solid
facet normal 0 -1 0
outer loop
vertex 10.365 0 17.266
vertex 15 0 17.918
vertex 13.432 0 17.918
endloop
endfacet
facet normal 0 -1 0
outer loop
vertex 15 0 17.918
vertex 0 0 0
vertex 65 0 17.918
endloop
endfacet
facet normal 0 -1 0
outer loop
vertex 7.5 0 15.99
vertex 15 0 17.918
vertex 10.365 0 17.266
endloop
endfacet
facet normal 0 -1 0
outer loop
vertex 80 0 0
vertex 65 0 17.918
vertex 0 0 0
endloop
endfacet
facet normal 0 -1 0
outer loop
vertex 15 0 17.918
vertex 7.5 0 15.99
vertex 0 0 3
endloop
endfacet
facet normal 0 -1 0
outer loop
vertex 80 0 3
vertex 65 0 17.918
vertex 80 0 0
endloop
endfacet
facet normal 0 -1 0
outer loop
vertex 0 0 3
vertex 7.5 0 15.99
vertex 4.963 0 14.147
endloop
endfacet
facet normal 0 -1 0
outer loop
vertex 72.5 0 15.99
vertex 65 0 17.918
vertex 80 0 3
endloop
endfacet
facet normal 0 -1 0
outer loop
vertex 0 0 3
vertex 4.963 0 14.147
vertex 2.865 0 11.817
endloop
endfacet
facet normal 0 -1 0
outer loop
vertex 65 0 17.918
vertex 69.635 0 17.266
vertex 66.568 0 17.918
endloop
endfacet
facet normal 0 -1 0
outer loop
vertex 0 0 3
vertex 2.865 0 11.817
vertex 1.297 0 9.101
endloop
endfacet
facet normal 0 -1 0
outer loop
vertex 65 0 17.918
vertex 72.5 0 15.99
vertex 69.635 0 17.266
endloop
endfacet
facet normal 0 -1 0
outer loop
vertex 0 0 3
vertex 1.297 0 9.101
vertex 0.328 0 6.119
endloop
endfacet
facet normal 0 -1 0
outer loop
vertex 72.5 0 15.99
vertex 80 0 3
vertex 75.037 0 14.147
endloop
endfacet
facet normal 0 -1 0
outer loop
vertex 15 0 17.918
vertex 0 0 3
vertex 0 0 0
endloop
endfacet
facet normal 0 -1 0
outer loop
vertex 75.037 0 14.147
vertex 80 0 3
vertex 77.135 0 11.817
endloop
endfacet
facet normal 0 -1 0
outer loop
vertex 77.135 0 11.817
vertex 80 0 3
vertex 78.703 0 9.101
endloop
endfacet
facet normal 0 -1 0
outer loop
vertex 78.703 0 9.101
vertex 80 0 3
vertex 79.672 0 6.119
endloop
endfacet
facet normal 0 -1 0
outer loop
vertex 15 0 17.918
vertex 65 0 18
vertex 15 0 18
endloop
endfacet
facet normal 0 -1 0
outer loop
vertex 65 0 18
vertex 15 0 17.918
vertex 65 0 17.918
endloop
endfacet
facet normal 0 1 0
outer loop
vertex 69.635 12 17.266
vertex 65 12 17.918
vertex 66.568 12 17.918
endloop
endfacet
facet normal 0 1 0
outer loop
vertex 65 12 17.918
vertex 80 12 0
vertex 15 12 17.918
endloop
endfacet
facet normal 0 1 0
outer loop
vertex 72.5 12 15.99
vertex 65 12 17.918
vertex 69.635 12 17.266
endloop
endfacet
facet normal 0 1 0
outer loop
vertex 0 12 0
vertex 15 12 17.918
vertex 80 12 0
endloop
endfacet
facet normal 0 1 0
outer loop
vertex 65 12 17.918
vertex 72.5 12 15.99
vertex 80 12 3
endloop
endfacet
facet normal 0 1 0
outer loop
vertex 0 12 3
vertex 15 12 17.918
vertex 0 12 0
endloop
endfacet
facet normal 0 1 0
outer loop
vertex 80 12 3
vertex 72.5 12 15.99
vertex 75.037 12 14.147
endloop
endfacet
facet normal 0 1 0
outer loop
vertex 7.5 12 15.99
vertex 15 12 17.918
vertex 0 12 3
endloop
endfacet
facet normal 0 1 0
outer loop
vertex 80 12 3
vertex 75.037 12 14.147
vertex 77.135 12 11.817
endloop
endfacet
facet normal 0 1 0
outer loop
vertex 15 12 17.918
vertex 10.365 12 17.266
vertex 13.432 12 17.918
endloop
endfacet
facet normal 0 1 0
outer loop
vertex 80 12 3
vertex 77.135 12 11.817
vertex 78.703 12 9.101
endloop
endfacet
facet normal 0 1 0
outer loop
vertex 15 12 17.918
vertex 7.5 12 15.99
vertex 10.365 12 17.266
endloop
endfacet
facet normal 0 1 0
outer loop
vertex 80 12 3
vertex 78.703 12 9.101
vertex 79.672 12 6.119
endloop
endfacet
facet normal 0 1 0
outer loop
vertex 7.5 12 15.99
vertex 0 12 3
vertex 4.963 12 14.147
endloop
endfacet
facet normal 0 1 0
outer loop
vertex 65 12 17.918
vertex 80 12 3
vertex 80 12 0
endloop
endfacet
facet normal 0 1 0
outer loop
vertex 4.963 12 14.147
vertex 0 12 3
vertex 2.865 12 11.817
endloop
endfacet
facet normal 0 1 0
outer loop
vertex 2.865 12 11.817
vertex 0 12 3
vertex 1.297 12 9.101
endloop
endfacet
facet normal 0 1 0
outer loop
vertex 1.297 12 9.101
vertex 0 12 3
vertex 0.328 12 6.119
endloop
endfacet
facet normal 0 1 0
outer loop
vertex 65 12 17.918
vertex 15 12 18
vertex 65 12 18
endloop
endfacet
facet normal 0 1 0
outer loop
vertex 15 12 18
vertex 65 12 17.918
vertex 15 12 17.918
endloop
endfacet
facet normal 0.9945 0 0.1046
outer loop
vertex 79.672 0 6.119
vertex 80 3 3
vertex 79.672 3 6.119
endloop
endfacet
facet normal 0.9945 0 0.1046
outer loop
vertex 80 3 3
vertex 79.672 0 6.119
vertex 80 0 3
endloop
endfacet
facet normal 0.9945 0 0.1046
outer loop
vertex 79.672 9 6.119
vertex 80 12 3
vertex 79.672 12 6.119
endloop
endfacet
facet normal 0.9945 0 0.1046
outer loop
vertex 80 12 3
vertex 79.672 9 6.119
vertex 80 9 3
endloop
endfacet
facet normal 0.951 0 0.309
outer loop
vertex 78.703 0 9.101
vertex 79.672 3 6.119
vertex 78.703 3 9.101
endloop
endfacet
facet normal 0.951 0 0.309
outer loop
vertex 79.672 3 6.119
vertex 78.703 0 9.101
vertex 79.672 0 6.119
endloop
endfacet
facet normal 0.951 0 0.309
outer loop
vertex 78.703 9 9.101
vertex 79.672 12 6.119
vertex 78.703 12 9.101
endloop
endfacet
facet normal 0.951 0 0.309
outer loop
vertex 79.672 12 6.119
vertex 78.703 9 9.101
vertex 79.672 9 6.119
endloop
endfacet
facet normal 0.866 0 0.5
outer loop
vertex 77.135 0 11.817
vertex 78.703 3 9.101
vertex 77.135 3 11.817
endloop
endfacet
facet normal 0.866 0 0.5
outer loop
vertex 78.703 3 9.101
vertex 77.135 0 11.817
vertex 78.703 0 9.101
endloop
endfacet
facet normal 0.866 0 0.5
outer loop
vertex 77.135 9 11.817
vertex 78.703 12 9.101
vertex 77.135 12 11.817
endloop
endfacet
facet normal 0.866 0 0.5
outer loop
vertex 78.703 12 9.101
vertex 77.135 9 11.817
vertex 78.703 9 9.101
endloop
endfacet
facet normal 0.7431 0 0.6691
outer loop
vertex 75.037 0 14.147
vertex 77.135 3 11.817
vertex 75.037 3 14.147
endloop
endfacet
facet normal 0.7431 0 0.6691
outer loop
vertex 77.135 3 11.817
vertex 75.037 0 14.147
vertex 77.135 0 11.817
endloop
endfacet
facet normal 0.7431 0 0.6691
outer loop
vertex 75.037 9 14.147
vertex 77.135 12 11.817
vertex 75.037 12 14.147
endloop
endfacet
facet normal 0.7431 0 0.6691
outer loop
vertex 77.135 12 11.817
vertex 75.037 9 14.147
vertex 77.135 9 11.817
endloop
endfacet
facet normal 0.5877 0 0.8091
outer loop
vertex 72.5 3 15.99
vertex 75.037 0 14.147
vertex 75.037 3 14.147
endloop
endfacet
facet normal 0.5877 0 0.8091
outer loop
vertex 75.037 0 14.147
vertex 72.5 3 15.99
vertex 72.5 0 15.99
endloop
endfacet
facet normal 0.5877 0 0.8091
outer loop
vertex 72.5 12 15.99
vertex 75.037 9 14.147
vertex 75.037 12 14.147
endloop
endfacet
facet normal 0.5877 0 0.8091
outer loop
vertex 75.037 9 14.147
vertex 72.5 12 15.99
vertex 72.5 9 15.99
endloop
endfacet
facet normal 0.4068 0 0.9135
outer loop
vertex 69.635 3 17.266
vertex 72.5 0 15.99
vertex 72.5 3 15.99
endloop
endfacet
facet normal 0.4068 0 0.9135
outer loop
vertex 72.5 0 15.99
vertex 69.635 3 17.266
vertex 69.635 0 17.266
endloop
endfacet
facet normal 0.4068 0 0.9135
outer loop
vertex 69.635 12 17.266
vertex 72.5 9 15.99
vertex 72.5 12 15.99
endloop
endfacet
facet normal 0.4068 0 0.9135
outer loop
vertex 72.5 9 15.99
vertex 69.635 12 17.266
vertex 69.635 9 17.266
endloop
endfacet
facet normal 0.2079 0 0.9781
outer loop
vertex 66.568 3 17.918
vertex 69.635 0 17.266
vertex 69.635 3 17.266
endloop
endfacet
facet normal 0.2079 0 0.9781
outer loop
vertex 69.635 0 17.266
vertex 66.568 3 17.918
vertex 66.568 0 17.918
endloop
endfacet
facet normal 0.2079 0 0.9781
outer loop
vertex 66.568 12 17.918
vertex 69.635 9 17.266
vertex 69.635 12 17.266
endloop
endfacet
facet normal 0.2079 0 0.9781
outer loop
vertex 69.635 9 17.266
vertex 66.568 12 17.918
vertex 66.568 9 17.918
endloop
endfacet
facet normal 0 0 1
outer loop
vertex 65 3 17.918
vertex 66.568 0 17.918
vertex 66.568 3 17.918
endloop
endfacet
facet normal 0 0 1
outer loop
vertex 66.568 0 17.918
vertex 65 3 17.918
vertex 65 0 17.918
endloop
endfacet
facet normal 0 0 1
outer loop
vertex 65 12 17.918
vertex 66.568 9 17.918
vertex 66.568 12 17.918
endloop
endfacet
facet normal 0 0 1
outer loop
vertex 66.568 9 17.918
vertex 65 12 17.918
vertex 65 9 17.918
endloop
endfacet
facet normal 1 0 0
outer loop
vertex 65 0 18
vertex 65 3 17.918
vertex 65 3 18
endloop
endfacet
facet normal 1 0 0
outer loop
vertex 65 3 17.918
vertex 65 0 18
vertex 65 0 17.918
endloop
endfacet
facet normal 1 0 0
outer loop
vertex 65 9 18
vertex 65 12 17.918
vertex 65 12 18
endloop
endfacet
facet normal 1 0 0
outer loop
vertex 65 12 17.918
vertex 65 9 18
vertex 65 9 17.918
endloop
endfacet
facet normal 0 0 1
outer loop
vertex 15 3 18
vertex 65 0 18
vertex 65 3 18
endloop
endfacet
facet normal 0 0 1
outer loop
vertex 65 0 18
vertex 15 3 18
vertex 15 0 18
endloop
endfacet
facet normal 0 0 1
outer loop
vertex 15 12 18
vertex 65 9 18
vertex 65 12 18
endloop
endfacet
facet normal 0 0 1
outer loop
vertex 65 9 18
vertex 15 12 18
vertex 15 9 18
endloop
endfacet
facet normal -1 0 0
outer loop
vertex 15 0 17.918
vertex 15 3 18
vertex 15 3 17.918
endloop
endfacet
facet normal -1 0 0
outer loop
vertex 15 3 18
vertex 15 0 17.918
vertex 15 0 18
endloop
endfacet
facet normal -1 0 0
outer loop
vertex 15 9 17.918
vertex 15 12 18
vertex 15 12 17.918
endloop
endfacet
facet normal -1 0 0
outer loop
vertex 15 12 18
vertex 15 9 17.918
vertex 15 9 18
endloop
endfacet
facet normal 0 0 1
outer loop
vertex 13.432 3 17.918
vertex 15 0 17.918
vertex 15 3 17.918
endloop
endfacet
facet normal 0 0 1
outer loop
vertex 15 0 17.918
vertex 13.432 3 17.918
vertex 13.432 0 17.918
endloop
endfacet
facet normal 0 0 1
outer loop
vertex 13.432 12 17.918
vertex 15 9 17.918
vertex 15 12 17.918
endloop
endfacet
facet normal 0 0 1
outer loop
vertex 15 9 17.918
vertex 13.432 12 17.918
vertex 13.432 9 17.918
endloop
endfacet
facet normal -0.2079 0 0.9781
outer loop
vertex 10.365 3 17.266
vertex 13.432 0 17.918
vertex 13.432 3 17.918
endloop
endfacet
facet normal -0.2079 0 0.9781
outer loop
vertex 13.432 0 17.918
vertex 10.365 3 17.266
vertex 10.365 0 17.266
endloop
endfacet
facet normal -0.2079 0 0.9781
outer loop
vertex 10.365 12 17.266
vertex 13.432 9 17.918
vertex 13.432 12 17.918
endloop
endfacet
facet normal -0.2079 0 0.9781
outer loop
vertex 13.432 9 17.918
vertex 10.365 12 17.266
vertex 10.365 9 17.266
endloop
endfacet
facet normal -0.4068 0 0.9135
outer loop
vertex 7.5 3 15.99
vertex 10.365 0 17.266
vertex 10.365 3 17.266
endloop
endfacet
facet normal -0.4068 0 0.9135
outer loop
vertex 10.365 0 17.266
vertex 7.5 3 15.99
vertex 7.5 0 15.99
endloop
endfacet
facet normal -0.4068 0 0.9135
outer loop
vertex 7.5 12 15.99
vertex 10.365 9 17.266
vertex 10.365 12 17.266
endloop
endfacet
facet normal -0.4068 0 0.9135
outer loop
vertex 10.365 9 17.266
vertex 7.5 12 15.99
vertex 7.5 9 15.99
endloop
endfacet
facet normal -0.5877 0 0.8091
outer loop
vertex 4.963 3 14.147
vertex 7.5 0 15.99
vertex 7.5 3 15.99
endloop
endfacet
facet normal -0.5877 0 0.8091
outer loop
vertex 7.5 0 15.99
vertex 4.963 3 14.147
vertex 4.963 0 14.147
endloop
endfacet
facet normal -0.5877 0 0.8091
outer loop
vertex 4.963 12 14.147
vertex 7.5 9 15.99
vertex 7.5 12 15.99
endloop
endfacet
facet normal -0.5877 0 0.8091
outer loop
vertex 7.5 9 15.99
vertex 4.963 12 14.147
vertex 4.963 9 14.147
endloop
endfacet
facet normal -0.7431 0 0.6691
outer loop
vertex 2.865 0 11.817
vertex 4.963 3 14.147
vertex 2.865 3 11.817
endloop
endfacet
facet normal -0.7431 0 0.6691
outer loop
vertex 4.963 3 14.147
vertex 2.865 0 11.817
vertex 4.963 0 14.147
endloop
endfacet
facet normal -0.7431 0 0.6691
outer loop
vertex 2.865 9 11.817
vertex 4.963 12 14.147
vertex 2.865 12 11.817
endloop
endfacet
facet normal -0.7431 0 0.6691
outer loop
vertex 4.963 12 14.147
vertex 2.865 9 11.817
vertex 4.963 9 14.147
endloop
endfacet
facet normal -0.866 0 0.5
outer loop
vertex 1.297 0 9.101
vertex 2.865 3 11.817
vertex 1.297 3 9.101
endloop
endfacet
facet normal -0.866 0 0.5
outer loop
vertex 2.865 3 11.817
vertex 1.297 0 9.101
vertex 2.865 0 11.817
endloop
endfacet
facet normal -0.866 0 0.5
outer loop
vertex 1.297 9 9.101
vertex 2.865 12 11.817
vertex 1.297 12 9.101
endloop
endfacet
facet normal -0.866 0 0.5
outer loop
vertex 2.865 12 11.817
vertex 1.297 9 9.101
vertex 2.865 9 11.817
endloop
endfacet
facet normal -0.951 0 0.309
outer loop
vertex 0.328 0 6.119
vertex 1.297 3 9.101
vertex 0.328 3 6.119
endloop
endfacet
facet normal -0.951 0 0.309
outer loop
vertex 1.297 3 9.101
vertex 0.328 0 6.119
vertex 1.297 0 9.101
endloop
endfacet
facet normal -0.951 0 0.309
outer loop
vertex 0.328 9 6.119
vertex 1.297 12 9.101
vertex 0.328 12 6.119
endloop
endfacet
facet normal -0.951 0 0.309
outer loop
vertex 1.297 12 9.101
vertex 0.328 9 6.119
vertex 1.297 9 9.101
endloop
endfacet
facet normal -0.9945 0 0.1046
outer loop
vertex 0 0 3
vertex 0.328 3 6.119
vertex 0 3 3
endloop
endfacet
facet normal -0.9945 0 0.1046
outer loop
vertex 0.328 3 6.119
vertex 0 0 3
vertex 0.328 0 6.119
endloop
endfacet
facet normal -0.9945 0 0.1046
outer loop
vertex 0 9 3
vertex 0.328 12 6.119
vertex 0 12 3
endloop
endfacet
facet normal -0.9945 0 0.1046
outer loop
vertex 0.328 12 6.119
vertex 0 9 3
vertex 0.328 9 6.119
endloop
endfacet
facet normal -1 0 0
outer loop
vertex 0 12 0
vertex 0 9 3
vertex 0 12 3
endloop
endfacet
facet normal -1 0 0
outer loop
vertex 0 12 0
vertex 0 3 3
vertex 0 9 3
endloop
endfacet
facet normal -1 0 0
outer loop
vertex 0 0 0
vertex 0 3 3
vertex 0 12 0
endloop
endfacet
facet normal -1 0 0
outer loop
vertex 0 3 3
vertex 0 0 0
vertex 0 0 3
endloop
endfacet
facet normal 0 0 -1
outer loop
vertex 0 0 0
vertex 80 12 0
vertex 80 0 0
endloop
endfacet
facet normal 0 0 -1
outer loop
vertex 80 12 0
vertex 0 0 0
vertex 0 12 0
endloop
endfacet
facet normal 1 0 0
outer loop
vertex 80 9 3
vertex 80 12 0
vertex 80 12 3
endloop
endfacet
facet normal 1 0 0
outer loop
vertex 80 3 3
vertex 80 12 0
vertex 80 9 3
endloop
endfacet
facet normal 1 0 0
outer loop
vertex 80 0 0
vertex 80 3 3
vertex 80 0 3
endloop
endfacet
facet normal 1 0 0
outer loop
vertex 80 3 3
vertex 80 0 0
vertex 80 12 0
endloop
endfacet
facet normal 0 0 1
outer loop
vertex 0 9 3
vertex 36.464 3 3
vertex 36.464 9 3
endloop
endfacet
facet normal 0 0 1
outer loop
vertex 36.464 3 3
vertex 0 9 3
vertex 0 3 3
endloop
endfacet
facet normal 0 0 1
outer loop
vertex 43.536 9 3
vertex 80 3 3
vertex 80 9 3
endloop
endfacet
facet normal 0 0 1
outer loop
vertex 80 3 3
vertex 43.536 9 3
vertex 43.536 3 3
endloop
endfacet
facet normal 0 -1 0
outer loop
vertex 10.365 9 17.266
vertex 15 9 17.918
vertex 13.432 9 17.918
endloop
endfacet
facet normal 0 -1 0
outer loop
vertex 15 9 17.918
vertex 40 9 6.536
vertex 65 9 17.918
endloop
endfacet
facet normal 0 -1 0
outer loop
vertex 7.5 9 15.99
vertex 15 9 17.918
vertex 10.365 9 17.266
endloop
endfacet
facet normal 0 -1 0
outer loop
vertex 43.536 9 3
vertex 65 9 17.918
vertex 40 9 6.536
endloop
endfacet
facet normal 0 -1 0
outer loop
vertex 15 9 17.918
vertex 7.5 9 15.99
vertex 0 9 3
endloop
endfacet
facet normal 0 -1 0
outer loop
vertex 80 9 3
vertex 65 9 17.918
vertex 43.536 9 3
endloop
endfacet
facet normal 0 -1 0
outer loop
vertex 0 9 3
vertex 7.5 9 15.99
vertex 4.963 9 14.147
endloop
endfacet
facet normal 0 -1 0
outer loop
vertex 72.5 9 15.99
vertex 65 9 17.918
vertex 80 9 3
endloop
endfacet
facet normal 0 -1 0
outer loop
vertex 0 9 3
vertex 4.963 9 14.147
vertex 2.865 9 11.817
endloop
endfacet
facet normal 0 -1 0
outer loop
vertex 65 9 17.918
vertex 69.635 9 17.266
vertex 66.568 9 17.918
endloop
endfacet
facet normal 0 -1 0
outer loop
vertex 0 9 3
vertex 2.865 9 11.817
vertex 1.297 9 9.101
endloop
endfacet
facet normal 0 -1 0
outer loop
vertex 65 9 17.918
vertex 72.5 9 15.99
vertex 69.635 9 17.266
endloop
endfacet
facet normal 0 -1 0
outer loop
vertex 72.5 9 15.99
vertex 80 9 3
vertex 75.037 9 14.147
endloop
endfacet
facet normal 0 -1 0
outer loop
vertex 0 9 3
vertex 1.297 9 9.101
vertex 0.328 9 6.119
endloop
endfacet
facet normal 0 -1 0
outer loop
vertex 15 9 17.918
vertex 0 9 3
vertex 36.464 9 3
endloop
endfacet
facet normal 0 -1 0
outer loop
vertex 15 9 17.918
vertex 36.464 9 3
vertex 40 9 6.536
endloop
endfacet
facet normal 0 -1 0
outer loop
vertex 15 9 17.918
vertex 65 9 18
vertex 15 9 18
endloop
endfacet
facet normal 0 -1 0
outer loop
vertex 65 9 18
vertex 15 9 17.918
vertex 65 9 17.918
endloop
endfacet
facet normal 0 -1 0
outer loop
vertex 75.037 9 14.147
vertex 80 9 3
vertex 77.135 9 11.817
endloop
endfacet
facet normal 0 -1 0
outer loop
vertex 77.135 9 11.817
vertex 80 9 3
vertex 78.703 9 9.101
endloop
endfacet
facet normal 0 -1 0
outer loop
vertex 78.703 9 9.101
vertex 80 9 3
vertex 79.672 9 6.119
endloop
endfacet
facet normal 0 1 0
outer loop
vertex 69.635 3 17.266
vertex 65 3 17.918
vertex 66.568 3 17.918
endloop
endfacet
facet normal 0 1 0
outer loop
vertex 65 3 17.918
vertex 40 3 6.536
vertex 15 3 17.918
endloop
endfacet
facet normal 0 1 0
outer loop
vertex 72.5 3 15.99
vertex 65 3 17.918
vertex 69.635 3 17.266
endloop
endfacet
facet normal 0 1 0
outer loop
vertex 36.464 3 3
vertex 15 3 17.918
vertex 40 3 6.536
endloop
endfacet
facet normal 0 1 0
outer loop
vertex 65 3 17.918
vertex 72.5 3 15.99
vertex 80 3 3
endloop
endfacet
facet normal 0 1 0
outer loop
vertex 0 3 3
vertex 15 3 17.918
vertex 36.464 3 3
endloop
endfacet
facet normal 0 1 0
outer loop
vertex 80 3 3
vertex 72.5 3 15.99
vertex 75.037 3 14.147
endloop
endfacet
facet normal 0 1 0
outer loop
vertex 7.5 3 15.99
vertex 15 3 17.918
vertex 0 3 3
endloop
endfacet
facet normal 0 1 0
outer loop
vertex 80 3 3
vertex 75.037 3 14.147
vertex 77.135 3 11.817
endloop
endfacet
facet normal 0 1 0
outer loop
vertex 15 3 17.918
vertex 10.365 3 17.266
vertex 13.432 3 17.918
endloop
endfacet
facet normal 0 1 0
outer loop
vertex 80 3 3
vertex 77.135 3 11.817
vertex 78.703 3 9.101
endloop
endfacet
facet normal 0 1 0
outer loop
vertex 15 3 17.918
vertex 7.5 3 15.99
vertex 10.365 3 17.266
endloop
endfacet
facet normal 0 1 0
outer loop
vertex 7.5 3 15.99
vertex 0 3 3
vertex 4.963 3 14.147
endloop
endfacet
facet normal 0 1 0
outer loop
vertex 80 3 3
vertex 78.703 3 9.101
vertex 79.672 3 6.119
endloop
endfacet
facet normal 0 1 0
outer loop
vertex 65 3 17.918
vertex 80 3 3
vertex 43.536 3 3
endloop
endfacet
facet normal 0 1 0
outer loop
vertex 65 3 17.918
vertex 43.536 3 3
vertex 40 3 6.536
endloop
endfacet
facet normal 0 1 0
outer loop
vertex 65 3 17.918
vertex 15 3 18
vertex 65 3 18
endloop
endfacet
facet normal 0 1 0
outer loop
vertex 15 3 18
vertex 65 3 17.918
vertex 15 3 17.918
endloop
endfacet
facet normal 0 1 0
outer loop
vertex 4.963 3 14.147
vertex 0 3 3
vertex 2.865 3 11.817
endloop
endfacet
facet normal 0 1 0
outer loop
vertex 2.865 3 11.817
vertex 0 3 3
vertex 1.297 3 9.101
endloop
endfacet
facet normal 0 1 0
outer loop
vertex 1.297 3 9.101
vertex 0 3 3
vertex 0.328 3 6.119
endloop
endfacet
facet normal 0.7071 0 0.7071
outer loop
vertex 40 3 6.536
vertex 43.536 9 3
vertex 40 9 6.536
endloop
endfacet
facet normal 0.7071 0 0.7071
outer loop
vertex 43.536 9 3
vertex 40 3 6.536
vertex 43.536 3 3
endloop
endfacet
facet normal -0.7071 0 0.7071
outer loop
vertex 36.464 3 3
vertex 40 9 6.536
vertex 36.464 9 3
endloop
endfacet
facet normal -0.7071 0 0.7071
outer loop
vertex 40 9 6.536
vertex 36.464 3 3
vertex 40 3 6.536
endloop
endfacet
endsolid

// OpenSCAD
INSERT_AMOUNT = 15;
BOARD_THICK = 5;
GAP_SIZE = BOARD_THICK + 1;
SIDE_THICK = 3;
TOP_THICK = 3;
LENGTH = 80;
MIDPOINT_BEVEL_THICK = 5;

difference() {
    rotate([-90, 0, 0])
    mirror([0, 1, 0])
    linear_extrude(SIDE_THICK * 2 + GAP_SIZE)
    union() {
        difference() {
            square([LENGTH, INSERT_AMOUNT + TOP_THICK])
                ;
            for (xoffs = [0, LENGTH - INSERT_AMOUNT])
            translate([xoffs, TOP_THICK])
            square([INSERT_AMOUNT, INSERT_AMOUNT])
                ;
        }
            ;
        for (xoffs = [INSERT_AMOUNT, LENGTH - INSERT_AMOUNT])
        translate([xoffs, TOP_THICK])
        intersection() {
            circle(INSERT_AMOUNT)
                ;
            translate([-99, 0])
            square(999)
                ;
        }
    }
    translate([-1, SIDE_THICK, TOP_THICK])
    cube([999, GAP_SIZE, 999])
        ;
}

translate([LENGTH / 2, SIDE_THICK + GAP_SIZE / 2, TOP_THICK])
intersection() {
    rotate([0, 45, 0])
    cube(
        [MIDPOINT_BEVEL_THICK, SIDE_THICK * 2 + GAP_SIZE, MIDPOINT_BEVEL_THICK],
        center=true
    )
        ;
    translate([-99, -99, 0])
    cube(999)
        ;
}
